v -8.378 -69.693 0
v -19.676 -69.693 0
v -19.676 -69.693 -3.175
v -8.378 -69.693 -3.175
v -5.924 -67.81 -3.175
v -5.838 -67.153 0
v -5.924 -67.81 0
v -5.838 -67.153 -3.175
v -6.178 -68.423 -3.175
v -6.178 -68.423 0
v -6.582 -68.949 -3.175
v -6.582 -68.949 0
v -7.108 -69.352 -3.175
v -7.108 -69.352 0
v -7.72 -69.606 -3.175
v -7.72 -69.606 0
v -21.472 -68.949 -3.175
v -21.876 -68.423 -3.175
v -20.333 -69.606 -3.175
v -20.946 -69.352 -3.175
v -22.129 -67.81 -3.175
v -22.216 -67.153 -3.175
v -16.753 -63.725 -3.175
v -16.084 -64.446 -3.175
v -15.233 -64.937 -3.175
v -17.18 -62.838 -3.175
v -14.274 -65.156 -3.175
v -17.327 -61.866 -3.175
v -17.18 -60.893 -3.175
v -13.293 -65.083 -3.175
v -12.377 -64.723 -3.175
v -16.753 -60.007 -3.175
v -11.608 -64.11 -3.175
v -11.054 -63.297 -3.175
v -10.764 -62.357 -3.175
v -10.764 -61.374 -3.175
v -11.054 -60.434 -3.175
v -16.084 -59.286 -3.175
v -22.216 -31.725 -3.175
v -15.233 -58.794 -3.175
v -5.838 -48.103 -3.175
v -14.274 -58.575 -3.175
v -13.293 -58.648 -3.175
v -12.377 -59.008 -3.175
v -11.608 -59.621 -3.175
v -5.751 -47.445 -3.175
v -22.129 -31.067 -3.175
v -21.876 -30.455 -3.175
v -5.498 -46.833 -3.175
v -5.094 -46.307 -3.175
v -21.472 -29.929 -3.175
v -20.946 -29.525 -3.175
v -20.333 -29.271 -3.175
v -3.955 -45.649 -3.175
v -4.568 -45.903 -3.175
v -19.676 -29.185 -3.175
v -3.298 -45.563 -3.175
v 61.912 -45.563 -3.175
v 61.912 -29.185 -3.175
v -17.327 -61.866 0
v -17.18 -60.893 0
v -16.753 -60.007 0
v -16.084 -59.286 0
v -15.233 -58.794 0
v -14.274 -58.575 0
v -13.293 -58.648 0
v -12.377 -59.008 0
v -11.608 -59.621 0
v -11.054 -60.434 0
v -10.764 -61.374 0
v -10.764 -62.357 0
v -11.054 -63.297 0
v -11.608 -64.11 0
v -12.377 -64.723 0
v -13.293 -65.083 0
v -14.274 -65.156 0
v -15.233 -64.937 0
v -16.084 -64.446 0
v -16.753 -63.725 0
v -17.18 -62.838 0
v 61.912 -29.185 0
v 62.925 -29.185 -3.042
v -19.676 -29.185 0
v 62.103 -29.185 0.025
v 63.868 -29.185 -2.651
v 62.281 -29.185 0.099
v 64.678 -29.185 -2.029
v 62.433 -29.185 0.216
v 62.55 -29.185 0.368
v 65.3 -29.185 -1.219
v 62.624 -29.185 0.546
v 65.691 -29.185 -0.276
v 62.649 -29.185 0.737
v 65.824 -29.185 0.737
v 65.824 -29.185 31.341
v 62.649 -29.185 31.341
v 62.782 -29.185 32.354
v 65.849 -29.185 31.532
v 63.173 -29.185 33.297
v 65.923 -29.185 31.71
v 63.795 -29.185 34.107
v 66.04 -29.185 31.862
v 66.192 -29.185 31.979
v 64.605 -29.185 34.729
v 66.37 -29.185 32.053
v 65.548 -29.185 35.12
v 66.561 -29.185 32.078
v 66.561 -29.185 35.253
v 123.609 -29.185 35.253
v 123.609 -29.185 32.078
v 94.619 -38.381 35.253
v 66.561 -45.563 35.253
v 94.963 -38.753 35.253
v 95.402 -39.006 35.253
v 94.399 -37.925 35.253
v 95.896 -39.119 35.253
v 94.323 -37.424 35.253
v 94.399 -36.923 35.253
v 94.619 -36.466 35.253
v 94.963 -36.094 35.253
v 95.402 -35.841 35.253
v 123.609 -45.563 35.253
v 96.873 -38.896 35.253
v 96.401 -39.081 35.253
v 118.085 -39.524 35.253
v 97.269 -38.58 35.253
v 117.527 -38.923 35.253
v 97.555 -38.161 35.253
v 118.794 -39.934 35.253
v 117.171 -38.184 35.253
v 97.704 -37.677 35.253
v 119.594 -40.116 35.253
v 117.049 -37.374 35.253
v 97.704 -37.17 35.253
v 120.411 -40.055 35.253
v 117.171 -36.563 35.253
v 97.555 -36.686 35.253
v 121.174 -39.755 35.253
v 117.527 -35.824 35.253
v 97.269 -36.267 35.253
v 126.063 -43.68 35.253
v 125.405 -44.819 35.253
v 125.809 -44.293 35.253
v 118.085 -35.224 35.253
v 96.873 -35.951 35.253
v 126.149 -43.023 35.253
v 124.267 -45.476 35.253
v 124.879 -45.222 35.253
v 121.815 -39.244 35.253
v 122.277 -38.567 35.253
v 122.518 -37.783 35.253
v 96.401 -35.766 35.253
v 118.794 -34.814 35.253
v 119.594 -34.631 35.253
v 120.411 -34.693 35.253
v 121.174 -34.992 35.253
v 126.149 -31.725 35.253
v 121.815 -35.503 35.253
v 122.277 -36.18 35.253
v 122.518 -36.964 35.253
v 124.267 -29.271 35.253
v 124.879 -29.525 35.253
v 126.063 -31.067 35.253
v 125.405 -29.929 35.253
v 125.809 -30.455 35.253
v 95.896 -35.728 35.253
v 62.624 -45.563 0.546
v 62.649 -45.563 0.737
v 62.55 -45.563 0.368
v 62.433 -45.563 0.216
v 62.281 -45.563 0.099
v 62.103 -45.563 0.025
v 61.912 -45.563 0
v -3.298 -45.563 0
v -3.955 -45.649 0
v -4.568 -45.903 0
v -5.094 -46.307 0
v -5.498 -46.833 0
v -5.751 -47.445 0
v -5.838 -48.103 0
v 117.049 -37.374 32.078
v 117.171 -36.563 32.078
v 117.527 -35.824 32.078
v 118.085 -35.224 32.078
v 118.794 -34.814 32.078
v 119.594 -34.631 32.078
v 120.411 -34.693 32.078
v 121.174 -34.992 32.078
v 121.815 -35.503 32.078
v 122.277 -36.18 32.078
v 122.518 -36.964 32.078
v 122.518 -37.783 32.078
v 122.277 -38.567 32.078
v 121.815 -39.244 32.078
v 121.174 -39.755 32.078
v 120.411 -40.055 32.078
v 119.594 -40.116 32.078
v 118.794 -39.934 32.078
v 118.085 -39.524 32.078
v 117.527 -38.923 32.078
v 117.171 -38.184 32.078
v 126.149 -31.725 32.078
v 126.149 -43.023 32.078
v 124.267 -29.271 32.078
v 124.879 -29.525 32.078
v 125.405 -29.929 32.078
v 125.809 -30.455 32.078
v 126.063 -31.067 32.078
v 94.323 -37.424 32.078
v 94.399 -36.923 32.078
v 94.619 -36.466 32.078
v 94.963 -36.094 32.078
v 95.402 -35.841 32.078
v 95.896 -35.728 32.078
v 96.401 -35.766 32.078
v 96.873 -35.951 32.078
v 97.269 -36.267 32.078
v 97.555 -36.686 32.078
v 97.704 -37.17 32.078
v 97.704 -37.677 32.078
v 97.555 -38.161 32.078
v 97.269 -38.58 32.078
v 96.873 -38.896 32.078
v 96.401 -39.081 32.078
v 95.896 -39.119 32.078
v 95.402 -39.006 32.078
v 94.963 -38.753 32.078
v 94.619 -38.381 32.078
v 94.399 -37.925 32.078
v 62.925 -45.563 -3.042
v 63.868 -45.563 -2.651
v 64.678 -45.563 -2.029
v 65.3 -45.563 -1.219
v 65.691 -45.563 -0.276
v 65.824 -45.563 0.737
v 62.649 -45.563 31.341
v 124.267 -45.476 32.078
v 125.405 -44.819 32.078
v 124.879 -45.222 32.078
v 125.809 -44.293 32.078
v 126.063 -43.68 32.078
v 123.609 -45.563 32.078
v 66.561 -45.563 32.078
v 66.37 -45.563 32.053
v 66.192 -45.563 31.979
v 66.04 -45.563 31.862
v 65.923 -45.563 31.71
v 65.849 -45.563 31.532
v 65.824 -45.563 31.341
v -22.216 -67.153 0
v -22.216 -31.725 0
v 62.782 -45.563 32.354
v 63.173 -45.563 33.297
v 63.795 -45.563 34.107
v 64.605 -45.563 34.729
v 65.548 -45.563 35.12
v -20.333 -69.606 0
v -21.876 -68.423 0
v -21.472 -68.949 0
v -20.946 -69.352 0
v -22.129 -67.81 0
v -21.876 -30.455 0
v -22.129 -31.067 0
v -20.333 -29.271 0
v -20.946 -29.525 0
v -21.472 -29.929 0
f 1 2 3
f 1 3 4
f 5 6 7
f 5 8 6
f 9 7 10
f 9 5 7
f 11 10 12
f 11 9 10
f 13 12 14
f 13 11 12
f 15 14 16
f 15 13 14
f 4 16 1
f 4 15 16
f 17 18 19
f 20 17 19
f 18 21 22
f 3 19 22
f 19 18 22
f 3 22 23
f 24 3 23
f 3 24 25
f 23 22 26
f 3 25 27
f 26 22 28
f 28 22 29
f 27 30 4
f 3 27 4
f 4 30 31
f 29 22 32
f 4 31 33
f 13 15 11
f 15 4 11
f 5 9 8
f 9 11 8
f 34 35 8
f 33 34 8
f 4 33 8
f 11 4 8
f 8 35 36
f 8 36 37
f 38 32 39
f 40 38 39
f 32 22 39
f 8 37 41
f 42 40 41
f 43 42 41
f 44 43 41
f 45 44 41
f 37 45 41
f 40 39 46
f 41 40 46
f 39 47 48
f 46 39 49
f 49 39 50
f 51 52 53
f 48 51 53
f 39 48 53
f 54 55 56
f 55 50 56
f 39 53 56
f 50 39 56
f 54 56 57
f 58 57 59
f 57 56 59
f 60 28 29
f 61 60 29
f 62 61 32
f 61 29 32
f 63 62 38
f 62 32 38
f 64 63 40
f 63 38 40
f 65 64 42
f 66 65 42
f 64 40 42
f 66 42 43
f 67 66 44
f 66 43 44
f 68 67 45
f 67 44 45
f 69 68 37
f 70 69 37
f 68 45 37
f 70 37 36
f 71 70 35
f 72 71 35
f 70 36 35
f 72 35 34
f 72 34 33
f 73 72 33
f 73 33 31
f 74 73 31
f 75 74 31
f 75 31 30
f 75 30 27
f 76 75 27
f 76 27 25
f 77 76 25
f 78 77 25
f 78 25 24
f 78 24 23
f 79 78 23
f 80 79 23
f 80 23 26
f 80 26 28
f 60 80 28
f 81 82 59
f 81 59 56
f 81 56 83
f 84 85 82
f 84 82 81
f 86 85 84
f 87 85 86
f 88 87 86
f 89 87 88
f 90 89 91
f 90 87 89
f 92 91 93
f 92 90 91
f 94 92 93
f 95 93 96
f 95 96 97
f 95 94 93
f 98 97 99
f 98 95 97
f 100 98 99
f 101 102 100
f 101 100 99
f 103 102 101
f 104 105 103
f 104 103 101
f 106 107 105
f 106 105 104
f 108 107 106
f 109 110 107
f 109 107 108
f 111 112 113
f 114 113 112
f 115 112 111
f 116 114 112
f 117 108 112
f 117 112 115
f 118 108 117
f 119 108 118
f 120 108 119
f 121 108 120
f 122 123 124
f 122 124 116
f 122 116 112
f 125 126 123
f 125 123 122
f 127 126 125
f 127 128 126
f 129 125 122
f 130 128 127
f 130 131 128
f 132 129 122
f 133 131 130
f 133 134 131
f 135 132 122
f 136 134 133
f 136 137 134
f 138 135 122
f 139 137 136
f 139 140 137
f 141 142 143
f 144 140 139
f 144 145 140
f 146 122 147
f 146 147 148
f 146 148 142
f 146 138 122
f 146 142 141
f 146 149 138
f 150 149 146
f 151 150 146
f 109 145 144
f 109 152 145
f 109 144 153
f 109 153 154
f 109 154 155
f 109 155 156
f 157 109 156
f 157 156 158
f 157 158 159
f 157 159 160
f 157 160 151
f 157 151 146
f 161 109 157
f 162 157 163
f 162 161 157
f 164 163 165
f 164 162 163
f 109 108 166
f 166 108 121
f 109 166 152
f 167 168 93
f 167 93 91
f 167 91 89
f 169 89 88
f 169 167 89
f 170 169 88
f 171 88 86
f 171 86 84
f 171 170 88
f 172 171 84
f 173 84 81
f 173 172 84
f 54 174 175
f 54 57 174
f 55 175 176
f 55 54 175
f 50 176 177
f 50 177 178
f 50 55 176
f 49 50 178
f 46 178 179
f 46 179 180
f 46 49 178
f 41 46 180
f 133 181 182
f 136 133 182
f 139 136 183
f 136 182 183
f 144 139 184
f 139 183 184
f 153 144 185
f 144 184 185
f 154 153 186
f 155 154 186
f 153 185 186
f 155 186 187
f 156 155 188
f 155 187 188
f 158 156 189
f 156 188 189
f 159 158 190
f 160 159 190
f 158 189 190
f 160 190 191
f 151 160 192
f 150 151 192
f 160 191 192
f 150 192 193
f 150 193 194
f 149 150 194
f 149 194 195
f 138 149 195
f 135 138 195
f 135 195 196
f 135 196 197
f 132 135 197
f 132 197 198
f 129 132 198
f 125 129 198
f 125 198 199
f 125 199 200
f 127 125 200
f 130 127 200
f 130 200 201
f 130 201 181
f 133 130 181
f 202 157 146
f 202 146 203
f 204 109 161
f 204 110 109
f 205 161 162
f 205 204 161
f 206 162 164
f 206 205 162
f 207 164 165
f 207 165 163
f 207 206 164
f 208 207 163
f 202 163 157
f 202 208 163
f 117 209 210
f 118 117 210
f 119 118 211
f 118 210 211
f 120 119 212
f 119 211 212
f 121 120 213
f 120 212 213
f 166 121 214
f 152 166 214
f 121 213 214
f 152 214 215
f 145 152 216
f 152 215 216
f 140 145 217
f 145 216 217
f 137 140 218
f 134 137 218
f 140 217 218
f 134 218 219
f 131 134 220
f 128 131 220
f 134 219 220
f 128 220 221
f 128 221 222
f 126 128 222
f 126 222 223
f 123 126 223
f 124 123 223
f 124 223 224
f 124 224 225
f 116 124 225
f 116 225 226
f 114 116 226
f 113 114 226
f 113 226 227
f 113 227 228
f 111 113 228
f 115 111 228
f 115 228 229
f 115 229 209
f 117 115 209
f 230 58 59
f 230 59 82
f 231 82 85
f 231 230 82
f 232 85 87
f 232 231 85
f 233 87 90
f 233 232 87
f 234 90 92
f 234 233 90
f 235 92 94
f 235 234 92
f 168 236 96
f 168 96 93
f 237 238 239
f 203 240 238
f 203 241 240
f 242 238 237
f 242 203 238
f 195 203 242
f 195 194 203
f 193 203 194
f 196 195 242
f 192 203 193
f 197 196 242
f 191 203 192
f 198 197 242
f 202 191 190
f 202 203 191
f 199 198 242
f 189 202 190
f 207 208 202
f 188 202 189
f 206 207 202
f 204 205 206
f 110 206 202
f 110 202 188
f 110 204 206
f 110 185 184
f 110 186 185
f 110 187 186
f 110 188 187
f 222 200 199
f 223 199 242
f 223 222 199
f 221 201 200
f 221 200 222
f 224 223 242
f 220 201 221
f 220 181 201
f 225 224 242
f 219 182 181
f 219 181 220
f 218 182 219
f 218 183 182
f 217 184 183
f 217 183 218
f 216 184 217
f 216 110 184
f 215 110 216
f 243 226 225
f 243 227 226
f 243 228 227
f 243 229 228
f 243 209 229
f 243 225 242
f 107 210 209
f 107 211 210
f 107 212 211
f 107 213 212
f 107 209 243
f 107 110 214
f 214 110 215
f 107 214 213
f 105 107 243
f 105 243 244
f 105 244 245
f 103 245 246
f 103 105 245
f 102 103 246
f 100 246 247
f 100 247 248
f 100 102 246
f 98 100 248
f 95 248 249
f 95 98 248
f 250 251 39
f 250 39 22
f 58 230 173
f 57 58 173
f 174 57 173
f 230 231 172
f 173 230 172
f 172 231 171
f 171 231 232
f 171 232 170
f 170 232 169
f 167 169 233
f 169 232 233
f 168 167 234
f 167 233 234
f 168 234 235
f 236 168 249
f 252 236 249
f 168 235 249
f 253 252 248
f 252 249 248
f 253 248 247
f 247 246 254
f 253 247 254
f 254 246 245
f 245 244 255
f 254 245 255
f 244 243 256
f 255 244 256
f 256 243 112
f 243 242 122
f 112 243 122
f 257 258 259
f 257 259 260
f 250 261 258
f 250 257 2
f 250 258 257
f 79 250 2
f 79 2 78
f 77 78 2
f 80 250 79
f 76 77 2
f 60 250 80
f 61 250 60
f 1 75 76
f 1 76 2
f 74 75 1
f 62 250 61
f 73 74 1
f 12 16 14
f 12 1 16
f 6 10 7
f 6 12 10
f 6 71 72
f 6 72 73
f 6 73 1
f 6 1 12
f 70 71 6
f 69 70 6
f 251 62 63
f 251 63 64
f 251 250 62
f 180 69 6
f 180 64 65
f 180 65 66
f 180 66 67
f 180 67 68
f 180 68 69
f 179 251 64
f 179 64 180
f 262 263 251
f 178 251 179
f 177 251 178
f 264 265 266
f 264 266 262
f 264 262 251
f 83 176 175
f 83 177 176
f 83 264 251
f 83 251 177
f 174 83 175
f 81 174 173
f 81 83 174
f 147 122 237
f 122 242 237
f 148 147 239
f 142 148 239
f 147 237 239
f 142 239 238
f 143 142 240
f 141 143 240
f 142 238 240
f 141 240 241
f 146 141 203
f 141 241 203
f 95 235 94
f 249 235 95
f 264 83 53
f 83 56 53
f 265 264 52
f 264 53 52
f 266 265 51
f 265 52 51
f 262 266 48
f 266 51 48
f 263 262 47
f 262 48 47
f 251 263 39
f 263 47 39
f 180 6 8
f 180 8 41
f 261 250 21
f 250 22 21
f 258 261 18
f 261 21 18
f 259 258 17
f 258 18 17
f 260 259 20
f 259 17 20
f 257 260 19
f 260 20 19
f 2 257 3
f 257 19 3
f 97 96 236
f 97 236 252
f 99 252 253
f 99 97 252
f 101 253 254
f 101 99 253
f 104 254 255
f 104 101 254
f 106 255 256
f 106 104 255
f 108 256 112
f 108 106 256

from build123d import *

# Parameters (mm, degrees)
BASE_FLANGE1_DEPTH           = 3.175
EDGE_FLANGE1_DEPTH           = 16.378
EDGE_FLANGE2_STRIP_W         = 14.1732
EDGE_FLANGE2_STRIP_H         = 3.175
EDGE_FLANGE2_STRIP_CUT_DEPTH = 16.378
EDGE_FLANGE2_DEPTH           = 16.378
M5_CLEARANCE_HOLE1_D         = 5.5
M6_CLEARANCE_HOLE1_D         = 6.6
FILLET1_R                    = 2.54
M3_CLEARANCE_HOLE1_D         = 3.4


# Sheet-metal steps are written as plain solids
with BuildPart() as part:
    # Sketch1 → Base-Flange1 (new body)
    with BuildSketch(Plane.XY):
        Polygon((-22.215900005, -29.184600001), (-22.215900005, -69.692600001), (-5.837899995, -69.692600001), (-5.837899995, -45.562600001), (61.9125, -45.562600001), (61.9125, -29.184600001), align=None)
    extrude(amount=-BASE_FLANGE1_DEPTH)

    # Edge-Flange1 section (across the edge) → Edge-Flange1 (add)
    with BuildSketch(Plane(origin=(62.6491, -45.562600001, 0), x_dir=(-1, 0, 0), z_dir=(0, 1, 0))):
        with BuildLine():
            Line((-3.175, 0.7366), (-3.175, 32.0779))
            Line((-3.175, 32.0779), (0, 32.0779))
            Line((0, 32.0779), (0, 0.7366))
            ThreePointArc((0, 0.7366), (0.215745145, 0.215745145), (0.7366, 0))
            Line((0.7366, 0), (0.7366, -3.175))
            ThreePointArc((0.7366, -3.175), (-2.029318885, -2.029318885), (-3.175, 0.7366))
        make_face()
    extrude(amount=EDGE_FLANGE1_DEPTH)

    # Edge-Flange2 strip (across the edge) → Edge-Flange2 strip cut (cut)
    with BuildSketch(Plane(origin=(65.8241, -29.184600001, 32.0779), x_dir=(0, 0, -1), z_dir=(0, -1, 0))):
        with Locations((-6.35, -1.5875)):
            Rectangle(EDGE_FLANGE2_STRIP_W, EDGE_FLANGE2_STRIP_H)
    extrude(amount=EDGE_FLANGE2_STRIP_CUT_DEPTH, mode=Mode.SUBTRACT)

    # Edge-Flange2 section (across the edge) → Edge-Flange2 (add)
    with BuildSketch(Plane(origin=(65.8241, -29.184600001, 32.0779), x_dir=(0, 0, -1), z_dir=(0, -1, 0))):
        with BuildLine():
            Line((-3.175, 0.7366), (-3.175, 60.325))
            Line((-3.175, 60.325), (0, 60.325))
            Line((0, 60.325), (0, 0.7366))
            ThreePointArc((0, 0.7366), (0.215745145, 0.215745145), (0.7366, 0))
            Line((0.7366, 0), (0.7366, -3.175))
            ThreePointArc((0.7366, -3.175), (-2.029318885, -2.029318885), (-3.175, 0.7366))
        make_face()
    extrude(amount=EDGE_FLANGE2_DEPTH)

    # M5 Clearance Hole1 (through all)
    with Locations(Plane.XY.offset(35.2529)):
        with Locations((119.7991, -37.373600001)):
            Hole(M5_CLEARANCE_HOLE1_D / 2)

    # M6 Clearance Hole1 (through all)
    with Locations(Plane.XY):
        with Locations((-14.0269, -61.865600001)):
            Hole(M6_CLEARANCE_HOLE1_D / 2)

    # Fillet1
    fillet1_edges = [part.edges().sort_by_distance(p)[0] for p in [
        (-22.215900005, -69.692600001, -1.5875),
        (-22.215900005, -29.184600001, -1.5875),
        (-5.837899995, -45.562600001, -1.5875),
        (-5.837899995, -69.692600001, -1.5875),
        (126.1491, -29.184600001, 33.6654),
        (126.1491, -45.562600001, 33.6654),
    ]]
    fillet(fillet1_edges, radius=FILLET1_R)

    # M3 Clearance Hole1 (through all)
    with Locations(Plane.XY.offset(35.2529)):
        with Locations((96.0232, -37.423600001)):
            Hole(M3_CLEARANCE_HOLE1_D / 2)


solid = part.part
